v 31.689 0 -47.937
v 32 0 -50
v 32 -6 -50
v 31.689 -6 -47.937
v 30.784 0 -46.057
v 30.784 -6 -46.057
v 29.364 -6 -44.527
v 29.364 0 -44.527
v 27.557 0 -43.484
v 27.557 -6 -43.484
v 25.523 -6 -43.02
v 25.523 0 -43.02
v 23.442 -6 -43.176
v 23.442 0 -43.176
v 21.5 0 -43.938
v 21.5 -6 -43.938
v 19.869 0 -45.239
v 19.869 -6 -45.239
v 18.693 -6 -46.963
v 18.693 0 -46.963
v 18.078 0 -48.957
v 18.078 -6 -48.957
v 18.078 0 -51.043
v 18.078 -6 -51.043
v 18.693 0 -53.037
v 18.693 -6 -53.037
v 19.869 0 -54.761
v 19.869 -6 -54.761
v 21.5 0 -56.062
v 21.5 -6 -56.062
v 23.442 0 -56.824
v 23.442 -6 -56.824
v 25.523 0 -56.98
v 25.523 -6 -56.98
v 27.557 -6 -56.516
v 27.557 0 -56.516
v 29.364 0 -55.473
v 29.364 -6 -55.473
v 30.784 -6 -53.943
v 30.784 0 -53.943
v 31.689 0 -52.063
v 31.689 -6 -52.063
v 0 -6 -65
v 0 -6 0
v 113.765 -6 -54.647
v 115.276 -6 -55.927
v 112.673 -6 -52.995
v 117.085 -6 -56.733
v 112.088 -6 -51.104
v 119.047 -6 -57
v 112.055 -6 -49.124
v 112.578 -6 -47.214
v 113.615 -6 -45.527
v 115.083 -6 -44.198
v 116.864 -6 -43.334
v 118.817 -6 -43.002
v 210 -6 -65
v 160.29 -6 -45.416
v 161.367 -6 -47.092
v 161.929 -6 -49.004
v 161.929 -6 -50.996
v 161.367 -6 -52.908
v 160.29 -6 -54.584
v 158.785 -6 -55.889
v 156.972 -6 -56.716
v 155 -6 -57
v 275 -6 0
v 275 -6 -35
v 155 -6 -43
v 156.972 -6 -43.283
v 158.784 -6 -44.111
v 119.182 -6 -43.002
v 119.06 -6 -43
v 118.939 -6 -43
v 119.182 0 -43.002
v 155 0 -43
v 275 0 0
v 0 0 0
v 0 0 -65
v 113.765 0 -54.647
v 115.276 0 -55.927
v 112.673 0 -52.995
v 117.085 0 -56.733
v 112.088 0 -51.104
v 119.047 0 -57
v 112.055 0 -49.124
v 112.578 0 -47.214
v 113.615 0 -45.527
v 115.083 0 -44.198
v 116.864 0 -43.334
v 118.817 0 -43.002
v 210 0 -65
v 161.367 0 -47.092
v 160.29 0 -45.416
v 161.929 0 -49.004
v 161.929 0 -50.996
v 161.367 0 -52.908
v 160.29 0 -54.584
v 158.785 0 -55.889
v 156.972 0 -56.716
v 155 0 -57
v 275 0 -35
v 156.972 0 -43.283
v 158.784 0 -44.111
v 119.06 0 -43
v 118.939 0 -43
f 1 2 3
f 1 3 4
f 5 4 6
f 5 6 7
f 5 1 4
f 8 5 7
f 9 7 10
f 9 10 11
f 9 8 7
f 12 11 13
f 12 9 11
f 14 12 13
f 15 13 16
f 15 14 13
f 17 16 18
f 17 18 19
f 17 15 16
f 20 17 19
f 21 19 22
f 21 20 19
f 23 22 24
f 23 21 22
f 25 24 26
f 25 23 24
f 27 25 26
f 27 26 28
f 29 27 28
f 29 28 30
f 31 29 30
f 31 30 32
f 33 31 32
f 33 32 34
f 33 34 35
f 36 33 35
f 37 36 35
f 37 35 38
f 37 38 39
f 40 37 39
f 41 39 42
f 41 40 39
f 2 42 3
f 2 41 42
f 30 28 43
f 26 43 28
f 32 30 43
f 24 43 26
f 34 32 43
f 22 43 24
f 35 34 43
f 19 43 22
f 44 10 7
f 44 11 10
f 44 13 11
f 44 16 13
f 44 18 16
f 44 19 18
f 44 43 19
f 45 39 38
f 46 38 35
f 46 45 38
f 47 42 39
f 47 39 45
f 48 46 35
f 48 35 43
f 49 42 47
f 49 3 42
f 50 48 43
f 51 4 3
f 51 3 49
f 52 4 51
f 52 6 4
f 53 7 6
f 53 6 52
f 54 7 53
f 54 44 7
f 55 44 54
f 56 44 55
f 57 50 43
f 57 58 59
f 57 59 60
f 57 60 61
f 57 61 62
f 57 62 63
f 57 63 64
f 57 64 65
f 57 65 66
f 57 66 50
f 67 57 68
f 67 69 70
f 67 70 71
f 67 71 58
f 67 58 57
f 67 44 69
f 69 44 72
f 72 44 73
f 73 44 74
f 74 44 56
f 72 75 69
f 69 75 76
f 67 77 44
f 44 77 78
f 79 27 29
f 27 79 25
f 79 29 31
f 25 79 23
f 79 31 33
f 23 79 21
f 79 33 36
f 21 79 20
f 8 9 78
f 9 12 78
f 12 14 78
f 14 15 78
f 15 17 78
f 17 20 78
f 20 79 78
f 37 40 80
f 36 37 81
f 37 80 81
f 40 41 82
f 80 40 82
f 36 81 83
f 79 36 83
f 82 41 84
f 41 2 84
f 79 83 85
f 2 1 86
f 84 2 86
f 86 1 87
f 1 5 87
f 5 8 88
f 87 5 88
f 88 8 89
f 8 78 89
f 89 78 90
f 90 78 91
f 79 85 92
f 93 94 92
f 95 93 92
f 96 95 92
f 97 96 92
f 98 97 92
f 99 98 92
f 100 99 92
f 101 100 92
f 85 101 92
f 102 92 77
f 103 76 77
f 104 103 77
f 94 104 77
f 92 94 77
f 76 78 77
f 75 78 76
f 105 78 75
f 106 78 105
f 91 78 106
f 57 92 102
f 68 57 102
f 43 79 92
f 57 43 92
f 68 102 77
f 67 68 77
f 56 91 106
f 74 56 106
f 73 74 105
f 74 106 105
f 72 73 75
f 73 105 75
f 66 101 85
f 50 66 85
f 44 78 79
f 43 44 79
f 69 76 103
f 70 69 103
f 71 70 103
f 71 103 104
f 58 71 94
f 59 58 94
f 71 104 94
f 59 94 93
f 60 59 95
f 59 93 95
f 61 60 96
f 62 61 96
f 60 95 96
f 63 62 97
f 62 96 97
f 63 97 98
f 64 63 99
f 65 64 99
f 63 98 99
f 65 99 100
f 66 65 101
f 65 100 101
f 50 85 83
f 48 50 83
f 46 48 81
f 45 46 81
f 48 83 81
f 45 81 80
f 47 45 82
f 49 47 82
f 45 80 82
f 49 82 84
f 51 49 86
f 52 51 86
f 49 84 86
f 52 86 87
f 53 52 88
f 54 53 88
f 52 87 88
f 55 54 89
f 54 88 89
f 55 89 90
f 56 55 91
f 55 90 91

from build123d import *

# Parameters (mm, degrees)
F0_R     = 7
F1_DEPTH = 6


with BuildPart() as f1:
    # F0 (on Front) → F1 (new body)
    with BuildSketch(Plane.XZ):
        Polygon((275, 0), (0, 0), (0, -65), (210, -65), (275, -35), align=None)
        with Locations((25, -50)):
            Circle(F0_R, mode=Mode.SUBTRACT)
        with BuildLine():
            ThreePointArc((154.999536, -43), (162, -49.999783), (154.999969, -57))
            Line((154.999969, -57), (119.04693, -56.999843))
            ThreePointArc((119.04693, -56.999843), (112.000947, -50.11512), (118.816702, -43.0024))
            ThreePointArc((118.816702, -43.0024), (118.999536, -43), (119.18237, -43.002376))
            Line((119.18237, -43.002376), (154.999536, -43))
        make_face(mode=Mode.SUBTRACT)
    extrude(amount=F1_DEPTH)


solid = f1.part
